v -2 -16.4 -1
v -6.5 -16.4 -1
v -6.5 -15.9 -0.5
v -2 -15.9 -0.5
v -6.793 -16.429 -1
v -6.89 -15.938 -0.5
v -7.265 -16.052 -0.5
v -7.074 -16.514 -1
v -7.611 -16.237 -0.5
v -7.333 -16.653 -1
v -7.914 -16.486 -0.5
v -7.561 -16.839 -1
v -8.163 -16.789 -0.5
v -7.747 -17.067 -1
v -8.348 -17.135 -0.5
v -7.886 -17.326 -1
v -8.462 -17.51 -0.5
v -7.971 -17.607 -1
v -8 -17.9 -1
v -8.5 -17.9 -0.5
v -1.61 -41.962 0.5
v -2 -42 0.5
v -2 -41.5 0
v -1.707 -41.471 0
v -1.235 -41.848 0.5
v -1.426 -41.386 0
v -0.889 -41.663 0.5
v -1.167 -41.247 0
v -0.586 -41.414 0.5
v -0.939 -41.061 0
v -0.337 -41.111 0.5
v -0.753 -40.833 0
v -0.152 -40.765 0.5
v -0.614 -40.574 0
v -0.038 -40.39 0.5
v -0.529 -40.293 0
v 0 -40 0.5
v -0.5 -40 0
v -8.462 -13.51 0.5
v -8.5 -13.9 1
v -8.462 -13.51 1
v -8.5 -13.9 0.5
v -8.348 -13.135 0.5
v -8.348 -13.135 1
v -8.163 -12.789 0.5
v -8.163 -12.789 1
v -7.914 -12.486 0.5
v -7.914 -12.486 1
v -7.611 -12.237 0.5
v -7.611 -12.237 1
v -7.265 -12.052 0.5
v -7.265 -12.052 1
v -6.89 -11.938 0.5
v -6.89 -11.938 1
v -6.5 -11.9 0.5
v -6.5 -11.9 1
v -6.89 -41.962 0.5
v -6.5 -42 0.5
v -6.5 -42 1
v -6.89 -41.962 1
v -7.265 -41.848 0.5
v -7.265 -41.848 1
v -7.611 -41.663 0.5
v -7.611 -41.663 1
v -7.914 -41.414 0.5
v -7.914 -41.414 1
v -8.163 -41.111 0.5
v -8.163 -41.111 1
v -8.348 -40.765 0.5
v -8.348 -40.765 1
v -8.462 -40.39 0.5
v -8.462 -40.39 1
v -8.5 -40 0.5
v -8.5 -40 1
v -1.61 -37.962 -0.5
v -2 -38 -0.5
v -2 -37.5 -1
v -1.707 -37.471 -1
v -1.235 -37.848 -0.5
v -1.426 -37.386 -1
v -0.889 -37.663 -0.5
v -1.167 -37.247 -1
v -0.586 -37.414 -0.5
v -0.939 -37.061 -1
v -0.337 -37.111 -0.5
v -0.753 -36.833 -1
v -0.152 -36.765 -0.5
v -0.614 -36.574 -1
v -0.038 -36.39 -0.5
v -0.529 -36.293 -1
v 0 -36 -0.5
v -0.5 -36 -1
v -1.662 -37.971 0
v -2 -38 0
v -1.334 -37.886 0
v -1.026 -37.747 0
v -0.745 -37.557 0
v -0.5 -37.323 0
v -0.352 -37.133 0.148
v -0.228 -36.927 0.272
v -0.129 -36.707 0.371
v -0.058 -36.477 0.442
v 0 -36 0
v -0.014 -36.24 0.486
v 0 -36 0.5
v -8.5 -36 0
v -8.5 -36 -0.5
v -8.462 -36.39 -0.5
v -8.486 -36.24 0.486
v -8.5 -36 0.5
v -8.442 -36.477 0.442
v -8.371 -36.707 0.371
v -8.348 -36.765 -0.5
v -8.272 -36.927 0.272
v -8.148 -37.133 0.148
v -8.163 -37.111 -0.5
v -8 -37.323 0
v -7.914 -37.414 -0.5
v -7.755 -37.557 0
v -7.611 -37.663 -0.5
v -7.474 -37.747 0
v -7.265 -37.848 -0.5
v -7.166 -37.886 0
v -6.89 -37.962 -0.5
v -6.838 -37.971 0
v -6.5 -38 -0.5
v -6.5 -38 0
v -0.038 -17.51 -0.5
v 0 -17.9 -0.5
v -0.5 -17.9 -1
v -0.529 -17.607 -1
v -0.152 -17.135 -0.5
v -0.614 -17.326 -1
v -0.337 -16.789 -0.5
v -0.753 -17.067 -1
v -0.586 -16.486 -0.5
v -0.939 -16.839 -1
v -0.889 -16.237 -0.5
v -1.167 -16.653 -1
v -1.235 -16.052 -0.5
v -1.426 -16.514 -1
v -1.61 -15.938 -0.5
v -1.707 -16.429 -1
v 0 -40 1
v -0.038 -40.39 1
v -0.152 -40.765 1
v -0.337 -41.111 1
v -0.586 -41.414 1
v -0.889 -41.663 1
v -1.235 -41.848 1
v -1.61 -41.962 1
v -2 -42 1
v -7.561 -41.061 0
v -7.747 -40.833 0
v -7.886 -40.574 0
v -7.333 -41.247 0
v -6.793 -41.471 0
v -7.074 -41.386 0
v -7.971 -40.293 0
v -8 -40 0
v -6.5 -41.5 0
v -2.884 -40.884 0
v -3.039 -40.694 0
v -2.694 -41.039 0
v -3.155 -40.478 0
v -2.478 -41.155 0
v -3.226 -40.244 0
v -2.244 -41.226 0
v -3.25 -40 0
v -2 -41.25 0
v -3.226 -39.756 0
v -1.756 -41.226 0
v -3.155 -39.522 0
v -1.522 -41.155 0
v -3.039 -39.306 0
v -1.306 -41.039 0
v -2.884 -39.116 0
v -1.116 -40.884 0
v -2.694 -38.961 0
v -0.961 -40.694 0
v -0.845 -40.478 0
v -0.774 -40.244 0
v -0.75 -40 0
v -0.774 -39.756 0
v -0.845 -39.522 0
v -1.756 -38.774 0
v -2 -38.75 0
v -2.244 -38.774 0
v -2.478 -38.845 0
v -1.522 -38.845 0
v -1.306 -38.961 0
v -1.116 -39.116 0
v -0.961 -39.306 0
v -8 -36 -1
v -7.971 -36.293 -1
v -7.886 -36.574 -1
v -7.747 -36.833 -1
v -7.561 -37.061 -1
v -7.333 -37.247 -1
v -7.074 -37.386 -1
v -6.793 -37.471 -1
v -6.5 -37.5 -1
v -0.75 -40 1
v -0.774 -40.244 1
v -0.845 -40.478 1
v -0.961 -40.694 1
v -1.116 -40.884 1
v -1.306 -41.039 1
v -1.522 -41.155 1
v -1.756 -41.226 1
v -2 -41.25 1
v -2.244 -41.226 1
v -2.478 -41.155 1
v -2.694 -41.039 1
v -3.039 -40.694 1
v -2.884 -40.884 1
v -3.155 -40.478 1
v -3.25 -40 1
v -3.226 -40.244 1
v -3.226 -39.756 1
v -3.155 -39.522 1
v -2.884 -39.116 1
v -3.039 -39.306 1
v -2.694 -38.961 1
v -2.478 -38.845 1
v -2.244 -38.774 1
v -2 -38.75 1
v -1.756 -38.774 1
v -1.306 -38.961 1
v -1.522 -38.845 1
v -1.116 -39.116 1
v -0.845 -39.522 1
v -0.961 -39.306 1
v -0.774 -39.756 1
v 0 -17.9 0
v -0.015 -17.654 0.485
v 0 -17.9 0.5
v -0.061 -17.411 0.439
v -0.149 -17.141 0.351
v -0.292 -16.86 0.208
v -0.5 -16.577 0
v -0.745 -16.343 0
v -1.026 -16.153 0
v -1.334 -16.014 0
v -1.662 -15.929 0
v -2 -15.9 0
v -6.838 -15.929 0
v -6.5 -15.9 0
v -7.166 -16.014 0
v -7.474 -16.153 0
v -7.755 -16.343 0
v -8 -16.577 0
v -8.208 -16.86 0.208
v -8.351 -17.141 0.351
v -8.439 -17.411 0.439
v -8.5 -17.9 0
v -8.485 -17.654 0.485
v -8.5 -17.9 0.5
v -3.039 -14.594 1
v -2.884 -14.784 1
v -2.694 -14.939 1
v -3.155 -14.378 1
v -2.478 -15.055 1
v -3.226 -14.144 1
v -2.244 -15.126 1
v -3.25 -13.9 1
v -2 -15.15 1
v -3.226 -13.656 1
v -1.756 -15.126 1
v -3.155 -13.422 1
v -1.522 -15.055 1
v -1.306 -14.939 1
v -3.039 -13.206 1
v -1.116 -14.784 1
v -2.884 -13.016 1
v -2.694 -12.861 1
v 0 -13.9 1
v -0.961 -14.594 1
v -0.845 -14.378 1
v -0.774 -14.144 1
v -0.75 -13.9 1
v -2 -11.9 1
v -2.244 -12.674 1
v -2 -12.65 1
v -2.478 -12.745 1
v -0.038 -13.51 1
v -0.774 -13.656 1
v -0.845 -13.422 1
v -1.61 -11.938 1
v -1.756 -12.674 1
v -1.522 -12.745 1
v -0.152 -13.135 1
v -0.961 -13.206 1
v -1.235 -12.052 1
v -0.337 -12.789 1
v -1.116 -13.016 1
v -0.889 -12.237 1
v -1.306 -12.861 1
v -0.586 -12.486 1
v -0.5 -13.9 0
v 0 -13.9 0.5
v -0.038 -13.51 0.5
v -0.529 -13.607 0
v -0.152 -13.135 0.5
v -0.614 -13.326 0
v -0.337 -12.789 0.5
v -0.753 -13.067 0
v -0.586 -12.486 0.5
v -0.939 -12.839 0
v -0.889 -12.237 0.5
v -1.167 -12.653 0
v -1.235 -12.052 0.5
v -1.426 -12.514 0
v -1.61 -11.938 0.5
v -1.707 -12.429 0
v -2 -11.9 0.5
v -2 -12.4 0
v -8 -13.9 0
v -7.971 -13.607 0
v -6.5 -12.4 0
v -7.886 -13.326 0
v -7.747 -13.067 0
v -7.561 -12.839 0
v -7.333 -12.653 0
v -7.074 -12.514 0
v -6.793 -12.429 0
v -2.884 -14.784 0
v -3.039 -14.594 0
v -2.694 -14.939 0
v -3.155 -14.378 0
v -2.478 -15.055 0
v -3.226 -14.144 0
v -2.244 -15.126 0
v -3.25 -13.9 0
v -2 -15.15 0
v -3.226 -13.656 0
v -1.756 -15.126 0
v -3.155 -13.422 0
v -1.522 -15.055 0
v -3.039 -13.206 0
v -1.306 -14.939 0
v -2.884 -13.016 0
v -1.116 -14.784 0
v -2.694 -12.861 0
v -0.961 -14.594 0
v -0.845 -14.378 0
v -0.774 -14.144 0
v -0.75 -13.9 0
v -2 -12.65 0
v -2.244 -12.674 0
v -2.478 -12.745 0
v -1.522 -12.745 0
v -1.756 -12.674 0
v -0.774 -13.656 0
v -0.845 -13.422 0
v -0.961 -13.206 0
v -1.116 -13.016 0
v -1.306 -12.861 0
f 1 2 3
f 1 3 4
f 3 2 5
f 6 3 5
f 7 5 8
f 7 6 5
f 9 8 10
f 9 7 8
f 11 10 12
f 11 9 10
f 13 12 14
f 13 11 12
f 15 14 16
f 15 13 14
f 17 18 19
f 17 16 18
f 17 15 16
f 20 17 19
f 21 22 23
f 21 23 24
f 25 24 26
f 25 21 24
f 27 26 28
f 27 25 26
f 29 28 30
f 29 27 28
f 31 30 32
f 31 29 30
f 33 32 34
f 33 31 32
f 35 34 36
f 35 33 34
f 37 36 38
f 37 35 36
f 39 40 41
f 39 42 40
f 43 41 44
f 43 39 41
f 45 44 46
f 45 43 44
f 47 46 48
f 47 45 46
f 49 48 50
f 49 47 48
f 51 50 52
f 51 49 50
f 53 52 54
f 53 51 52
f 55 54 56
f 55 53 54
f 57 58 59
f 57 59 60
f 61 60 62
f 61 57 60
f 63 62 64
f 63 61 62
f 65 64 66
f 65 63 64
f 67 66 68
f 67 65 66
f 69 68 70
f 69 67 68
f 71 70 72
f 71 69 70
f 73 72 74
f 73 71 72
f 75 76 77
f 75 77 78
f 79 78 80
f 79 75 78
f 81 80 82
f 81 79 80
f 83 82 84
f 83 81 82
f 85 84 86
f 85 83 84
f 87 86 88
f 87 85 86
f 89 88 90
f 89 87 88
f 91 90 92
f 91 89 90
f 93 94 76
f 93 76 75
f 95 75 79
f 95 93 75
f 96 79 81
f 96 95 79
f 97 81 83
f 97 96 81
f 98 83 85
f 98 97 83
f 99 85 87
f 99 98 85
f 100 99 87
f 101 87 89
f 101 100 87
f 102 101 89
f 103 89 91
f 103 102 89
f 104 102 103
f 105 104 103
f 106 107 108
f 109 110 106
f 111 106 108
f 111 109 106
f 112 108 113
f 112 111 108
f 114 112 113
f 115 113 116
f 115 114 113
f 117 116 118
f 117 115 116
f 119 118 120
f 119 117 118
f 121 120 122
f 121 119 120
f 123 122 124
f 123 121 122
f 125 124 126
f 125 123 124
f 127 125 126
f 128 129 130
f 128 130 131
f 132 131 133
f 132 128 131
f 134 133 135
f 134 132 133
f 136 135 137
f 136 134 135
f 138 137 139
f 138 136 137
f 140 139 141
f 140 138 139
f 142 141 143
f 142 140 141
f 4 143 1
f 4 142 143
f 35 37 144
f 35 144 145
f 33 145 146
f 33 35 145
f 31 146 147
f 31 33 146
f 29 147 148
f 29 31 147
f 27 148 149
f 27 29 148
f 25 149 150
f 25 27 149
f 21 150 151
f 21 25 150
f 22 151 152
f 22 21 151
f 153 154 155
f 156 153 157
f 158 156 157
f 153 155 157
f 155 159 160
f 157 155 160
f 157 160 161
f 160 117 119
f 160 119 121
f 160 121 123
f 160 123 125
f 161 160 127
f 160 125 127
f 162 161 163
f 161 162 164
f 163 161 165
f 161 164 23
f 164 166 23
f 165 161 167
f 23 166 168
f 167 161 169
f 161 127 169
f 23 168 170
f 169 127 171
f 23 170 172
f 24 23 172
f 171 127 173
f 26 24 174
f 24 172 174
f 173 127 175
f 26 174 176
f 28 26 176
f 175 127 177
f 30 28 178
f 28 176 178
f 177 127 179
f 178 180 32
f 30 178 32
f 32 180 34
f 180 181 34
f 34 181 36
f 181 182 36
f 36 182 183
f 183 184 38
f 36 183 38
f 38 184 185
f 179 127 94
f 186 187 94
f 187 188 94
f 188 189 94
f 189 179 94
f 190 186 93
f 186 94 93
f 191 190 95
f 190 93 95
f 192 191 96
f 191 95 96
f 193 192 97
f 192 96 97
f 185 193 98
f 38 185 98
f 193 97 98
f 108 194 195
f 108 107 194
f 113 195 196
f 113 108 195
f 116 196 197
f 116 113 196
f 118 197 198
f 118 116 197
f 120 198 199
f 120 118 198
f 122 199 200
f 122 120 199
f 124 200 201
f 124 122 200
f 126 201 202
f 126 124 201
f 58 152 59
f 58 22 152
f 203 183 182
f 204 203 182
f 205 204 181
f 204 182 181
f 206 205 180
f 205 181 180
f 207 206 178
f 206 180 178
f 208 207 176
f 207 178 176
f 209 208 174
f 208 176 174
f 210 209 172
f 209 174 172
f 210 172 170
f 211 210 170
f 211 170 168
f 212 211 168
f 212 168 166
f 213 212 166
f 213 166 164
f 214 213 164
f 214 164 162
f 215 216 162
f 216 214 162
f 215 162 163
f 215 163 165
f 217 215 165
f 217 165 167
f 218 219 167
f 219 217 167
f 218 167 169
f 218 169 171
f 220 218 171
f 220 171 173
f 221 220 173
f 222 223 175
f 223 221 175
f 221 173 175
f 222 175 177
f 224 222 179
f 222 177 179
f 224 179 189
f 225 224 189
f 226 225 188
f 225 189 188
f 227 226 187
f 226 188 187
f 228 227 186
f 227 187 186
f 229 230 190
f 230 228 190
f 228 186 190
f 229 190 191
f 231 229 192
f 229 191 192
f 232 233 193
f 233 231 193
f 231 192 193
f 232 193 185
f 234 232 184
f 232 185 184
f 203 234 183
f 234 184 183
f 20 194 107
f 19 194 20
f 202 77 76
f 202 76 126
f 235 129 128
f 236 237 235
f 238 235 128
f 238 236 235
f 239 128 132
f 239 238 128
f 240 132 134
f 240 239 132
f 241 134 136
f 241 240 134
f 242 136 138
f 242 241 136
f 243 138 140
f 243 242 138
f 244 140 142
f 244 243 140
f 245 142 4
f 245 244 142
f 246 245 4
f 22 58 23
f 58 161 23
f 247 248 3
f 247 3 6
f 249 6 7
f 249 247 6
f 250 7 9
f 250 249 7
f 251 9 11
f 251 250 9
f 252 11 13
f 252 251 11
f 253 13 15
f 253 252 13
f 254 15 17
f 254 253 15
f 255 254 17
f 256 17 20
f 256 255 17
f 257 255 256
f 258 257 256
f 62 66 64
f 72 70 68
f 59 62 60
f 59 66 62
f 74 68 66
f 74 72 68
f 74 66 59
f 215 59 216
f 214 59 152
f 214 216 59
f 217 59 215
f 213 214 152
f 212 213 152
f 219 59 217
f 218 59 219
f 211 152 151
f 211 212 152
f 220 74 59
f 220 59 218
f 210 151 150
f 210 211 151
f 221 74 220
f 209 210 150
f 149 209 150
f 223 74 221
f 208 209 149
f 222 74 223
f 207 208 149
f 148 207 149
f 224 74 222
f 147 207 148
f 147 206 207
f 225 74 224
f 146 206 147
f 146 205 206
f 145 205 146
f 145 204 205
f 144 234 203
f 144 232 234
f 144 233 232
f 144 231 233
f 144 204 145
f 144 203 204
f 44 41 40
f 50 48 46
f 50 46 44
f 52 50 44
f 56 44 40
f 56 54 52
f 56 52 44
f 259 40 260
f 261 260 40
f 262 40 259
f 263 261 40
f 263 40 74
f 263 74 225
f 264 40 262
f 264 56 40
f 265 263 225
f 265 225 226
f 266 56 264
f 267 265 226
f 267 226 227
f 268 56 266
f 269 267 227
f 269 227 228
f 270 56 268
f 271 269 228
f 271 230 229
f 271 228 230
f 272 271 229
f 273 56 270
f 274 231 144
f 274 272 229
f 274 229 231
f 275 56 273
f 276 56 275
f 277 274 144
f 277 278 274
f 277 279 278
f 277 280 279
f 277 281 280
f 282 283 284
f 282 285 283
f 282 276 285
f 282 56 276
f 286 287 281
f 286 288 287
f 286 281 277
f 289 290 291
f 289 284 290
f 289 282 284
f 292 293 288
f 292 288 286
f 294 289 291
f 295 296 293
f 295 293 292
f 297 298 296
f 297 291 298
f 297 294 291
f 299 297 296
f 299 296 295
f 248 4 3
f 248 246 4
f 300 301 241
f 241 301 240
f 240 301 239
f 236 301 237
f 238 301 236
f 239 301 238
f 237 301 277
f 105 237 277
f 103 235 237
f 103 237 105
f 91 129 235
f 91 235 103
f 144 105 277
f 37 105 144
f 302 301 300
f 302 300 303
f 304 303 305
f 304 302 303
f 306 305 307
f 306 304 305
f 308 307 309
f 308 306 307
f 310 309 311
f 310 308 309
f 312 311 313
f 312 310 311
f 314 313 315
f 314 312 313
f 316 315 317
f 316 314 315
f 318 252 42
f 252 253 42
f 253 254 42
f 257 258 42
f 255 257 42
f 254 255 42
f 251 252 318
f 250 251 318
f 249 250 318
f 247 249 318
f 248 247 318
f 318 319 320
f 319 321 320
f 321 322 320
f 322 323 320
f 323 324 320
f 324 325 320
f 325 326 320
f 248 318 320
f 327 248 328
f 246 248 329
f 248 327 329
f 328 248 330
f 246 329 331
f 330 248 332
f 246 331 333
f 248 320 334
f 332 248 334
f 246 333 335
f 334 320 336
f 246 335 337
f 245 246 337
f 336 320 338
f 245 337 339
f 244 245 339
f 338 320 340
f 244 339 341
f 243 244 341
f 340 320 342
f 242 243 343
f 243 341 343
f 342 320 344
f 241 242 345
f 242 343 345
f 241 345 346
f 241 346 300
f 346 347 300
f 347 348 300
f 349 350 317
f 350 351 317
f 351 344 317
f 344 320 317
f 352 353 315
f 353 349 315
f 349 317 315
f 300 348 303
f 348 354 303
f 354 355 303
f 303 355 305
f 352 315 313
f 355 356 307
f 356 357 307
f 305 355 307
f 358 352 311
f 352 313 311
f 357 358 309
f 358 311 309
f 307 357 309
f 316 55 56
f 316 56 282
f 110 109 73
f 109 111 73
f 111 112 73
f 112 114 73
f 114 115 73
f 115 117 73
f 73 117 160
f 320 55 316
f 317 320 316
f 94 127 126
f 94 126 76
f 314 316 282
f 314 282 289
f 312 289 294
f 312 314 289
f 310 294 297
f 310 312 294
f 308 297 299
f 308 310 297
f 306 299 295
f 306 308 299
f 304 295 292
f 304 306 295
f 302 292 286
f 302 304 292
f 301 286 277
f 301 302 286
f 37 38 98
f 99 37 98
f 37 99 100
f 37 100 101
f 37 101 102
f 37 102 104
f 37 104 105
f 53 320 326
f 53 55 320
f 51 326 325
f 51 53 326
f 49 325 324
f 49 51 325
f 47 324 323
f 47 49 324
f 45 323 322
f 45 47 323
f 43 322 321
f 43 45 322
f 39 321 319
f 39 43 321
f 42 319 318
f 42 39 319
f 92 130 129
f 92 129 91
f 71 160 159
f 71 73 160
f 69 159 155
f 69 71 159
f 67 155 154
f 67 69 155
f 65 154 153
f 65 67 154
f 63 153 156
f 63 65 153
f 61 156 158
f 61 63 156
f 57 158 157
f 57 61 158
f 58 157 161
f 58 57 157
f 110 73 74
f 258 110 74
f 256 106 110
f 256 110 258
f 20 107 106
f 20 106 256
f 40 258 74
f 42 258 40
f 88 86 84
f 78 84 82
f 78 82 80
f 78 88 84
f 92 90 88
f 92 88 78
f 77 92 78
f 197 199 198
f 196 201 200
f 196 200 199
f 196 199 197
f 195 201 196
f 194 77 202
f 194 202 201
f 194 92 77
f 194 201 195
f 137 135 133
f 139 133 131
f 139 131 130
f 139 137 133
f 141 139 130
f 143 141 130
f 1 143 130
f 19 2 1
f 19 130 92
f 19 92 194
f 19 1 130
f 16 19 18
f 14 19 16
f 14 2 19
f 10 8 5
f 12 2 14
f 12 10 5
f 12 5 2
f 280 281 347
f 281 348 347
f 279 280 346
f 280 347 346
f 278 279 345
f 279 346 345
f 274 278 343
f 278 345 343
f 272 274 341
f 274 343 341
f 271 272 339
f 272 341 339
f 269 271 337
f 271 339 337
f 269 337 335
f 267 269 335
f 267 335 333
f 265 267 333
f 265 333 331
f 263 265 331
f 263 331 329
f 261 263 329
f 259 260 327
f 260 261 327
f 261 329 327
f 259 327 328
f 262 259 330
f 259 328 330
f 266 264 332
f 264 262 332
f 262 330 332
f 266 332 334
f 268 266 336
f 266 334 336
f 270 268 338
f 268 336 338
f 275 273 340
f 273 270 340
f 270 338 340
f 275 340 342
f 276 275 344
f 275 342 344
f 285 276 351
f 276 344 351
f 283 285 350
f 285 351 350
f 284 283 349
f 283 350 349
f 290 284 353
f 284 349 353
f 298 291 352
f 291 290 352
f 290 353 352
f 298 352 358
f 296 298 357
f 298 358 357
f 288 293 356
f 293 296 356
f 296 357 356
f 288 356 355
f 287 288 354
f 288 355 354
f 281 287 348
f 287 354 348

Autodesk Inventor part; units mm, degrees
ref_plane "YZ Plane" through (0, 0, 0) normal (1, 0, 0) x (0, 1, 0)
ref_plane "XZ Plane" through (0, 0, 0) normal (0, 1, 0) x (-1, 0, 0)
ref_plane "XY Plane" through (0, 0, 0) normal (0, 0, 1) x (1, 0, 0)
sketch "Sketch1" plane through (0, 0, 0) normal (0, 0, 1) x (1, 0, 0)
  line L0 (-10.4863, 511.0554) -> (-10.4863, 506.5554) construction
  line L1 (-10.4863, 511.0554) -> (-10.4863, 506.5554) construction
  line L2 (-10.4863, 506.5554) -> (-10.4863, 513.0554) construction
  line L3 (-10.4863, 504.5554) -> (-10.4863, 511.0554) construction
  line L4 (-6.5, -11.9) -> (-2, -11.9)
  line L5 (0, -13.9) -> (0, -40)
  line L6 (-2, -42) -> (-6.5, -42)
  line L7 (-8.5, -40) -> (-8.5, -13.9)
  arc A0 (-6.5, -11.9) -> (-8.5, -13.9) centre (-6.5, -13.9) ccw
  arc A1 (0, -13.9) -> (-2, -11.9) centre (-2, -13.9) ccw
  arc A2 (-2, -42) -> (0, -40) centre (-2, -40) ccw
  arc A3 (-8.5, -40) -> (-6.5, -42) centre (-6.5, -40) ccw
  circle A4 centre (-2, -13.9) radius 1.25
  circle A5 centre (-2, -40) radius 1.25
  line L8 (-10.4863, 509.8054) -> (-10.4863, 512.3054) projected
  line L9 (-10.4863, 506.5554) -> (-10.4863, 506.5554) projected
  line L10 (-10.4863, 511.0554) -> (-10.4863, 513.0554) projected
  line L11 (-10.4863, 511.0554) -> (-10.4863, 511.0554) projected
  line L12 (-10.4863, 504.5554) -> (-10.4863, 506.5554) projected
  line L13 (-10.4863, 506.5554) -> (-10.4863, 504.5554) projected
  line L14 (-10.4863, 506.5554) -> (-10.4863, 506.5554) projected
  line L15 (-10.4863, 513.0554) -> (-10.4863, 511.0554) projected
  line L16 (-10.4863, 511.0554) -> (-10.4863, 511.0554) projected
  line L17 (-10.4863, 509.8054) -> (-10.4863, 512.3054) projected
  point P0 (0, 0)
  dimension "d0" = 2
extrude "Extrusion1" add sketch "Sketch1" along normal blind 1
sketch "Sketch2" plane through (0, 0, 0) normal (0, 0, -1) x (-1, 0, 0)
  line L0 (8.5, -13.9) -> (8.5, -40) projected
  line L1 (2, -11.9) -> (6.5, -11.9) projected
  line L2 (0, -40) -> (0, -13.9) projected
  line L3 (6.5, -42) -> (2, -42) projected
  line L4 (2, -15.9) -> (6.5, -15.9)
  line L5 (8.5, -17.9) -> (8.5, -36)
  line L6 (6.5, -38) -> (2, -38)
  line L7 (0, -36) -> (0, -17.9)
  arc A0 (2, -15.9) -> (0, -17.9) centre (2, -17.9) ccw
  arc A1 (8.5, -17.9) -> (6.5, -15.9) centre (6.5, -17.9) ccw
  arc A2 (6.5, -38) -> (8.5, -36) centre (6.5, -36) ccw
  arc A3 (0, -36) -> (2, -38) centre (2, -36) ccw
  point P0 (0, 0)
  point P1 (0, -15.9)
  point P2 (8.5, -38)
  dimension "d3" = 2
  dimension "d4" = 4
  dimension "d5" = 4
extrude "Extrusion2" add sketch "Sketch2" along normal blind 1
chamfer "Chamfer1" distance 0.5 angle 45 18 edges at (-0.5858, -16.4858, -1) (0, -26.95, -1) (-0.5858, -37.4142, -1) (-4.25, -38, -1) (-7.9142, -37.4142, -1) (-8.5, -26.95, -1) (-7.9142, -16.4858, -1) (-4.25, -15.9, -1) (0, -15.9, 0) (-0.5858, -12.4858, 0) (-4.25, -11.9, 0) (-7.9142, -12.4858, 0) (-8.5, -15.9, 0) (-0.5858, -41.4142, 0) (0, -38, 0) (-4.25, -42, 0) (-7.9142, -41.4142, 0) (-8.5, -38, 0)
properties part number "IO-Shield-Topplate01"
